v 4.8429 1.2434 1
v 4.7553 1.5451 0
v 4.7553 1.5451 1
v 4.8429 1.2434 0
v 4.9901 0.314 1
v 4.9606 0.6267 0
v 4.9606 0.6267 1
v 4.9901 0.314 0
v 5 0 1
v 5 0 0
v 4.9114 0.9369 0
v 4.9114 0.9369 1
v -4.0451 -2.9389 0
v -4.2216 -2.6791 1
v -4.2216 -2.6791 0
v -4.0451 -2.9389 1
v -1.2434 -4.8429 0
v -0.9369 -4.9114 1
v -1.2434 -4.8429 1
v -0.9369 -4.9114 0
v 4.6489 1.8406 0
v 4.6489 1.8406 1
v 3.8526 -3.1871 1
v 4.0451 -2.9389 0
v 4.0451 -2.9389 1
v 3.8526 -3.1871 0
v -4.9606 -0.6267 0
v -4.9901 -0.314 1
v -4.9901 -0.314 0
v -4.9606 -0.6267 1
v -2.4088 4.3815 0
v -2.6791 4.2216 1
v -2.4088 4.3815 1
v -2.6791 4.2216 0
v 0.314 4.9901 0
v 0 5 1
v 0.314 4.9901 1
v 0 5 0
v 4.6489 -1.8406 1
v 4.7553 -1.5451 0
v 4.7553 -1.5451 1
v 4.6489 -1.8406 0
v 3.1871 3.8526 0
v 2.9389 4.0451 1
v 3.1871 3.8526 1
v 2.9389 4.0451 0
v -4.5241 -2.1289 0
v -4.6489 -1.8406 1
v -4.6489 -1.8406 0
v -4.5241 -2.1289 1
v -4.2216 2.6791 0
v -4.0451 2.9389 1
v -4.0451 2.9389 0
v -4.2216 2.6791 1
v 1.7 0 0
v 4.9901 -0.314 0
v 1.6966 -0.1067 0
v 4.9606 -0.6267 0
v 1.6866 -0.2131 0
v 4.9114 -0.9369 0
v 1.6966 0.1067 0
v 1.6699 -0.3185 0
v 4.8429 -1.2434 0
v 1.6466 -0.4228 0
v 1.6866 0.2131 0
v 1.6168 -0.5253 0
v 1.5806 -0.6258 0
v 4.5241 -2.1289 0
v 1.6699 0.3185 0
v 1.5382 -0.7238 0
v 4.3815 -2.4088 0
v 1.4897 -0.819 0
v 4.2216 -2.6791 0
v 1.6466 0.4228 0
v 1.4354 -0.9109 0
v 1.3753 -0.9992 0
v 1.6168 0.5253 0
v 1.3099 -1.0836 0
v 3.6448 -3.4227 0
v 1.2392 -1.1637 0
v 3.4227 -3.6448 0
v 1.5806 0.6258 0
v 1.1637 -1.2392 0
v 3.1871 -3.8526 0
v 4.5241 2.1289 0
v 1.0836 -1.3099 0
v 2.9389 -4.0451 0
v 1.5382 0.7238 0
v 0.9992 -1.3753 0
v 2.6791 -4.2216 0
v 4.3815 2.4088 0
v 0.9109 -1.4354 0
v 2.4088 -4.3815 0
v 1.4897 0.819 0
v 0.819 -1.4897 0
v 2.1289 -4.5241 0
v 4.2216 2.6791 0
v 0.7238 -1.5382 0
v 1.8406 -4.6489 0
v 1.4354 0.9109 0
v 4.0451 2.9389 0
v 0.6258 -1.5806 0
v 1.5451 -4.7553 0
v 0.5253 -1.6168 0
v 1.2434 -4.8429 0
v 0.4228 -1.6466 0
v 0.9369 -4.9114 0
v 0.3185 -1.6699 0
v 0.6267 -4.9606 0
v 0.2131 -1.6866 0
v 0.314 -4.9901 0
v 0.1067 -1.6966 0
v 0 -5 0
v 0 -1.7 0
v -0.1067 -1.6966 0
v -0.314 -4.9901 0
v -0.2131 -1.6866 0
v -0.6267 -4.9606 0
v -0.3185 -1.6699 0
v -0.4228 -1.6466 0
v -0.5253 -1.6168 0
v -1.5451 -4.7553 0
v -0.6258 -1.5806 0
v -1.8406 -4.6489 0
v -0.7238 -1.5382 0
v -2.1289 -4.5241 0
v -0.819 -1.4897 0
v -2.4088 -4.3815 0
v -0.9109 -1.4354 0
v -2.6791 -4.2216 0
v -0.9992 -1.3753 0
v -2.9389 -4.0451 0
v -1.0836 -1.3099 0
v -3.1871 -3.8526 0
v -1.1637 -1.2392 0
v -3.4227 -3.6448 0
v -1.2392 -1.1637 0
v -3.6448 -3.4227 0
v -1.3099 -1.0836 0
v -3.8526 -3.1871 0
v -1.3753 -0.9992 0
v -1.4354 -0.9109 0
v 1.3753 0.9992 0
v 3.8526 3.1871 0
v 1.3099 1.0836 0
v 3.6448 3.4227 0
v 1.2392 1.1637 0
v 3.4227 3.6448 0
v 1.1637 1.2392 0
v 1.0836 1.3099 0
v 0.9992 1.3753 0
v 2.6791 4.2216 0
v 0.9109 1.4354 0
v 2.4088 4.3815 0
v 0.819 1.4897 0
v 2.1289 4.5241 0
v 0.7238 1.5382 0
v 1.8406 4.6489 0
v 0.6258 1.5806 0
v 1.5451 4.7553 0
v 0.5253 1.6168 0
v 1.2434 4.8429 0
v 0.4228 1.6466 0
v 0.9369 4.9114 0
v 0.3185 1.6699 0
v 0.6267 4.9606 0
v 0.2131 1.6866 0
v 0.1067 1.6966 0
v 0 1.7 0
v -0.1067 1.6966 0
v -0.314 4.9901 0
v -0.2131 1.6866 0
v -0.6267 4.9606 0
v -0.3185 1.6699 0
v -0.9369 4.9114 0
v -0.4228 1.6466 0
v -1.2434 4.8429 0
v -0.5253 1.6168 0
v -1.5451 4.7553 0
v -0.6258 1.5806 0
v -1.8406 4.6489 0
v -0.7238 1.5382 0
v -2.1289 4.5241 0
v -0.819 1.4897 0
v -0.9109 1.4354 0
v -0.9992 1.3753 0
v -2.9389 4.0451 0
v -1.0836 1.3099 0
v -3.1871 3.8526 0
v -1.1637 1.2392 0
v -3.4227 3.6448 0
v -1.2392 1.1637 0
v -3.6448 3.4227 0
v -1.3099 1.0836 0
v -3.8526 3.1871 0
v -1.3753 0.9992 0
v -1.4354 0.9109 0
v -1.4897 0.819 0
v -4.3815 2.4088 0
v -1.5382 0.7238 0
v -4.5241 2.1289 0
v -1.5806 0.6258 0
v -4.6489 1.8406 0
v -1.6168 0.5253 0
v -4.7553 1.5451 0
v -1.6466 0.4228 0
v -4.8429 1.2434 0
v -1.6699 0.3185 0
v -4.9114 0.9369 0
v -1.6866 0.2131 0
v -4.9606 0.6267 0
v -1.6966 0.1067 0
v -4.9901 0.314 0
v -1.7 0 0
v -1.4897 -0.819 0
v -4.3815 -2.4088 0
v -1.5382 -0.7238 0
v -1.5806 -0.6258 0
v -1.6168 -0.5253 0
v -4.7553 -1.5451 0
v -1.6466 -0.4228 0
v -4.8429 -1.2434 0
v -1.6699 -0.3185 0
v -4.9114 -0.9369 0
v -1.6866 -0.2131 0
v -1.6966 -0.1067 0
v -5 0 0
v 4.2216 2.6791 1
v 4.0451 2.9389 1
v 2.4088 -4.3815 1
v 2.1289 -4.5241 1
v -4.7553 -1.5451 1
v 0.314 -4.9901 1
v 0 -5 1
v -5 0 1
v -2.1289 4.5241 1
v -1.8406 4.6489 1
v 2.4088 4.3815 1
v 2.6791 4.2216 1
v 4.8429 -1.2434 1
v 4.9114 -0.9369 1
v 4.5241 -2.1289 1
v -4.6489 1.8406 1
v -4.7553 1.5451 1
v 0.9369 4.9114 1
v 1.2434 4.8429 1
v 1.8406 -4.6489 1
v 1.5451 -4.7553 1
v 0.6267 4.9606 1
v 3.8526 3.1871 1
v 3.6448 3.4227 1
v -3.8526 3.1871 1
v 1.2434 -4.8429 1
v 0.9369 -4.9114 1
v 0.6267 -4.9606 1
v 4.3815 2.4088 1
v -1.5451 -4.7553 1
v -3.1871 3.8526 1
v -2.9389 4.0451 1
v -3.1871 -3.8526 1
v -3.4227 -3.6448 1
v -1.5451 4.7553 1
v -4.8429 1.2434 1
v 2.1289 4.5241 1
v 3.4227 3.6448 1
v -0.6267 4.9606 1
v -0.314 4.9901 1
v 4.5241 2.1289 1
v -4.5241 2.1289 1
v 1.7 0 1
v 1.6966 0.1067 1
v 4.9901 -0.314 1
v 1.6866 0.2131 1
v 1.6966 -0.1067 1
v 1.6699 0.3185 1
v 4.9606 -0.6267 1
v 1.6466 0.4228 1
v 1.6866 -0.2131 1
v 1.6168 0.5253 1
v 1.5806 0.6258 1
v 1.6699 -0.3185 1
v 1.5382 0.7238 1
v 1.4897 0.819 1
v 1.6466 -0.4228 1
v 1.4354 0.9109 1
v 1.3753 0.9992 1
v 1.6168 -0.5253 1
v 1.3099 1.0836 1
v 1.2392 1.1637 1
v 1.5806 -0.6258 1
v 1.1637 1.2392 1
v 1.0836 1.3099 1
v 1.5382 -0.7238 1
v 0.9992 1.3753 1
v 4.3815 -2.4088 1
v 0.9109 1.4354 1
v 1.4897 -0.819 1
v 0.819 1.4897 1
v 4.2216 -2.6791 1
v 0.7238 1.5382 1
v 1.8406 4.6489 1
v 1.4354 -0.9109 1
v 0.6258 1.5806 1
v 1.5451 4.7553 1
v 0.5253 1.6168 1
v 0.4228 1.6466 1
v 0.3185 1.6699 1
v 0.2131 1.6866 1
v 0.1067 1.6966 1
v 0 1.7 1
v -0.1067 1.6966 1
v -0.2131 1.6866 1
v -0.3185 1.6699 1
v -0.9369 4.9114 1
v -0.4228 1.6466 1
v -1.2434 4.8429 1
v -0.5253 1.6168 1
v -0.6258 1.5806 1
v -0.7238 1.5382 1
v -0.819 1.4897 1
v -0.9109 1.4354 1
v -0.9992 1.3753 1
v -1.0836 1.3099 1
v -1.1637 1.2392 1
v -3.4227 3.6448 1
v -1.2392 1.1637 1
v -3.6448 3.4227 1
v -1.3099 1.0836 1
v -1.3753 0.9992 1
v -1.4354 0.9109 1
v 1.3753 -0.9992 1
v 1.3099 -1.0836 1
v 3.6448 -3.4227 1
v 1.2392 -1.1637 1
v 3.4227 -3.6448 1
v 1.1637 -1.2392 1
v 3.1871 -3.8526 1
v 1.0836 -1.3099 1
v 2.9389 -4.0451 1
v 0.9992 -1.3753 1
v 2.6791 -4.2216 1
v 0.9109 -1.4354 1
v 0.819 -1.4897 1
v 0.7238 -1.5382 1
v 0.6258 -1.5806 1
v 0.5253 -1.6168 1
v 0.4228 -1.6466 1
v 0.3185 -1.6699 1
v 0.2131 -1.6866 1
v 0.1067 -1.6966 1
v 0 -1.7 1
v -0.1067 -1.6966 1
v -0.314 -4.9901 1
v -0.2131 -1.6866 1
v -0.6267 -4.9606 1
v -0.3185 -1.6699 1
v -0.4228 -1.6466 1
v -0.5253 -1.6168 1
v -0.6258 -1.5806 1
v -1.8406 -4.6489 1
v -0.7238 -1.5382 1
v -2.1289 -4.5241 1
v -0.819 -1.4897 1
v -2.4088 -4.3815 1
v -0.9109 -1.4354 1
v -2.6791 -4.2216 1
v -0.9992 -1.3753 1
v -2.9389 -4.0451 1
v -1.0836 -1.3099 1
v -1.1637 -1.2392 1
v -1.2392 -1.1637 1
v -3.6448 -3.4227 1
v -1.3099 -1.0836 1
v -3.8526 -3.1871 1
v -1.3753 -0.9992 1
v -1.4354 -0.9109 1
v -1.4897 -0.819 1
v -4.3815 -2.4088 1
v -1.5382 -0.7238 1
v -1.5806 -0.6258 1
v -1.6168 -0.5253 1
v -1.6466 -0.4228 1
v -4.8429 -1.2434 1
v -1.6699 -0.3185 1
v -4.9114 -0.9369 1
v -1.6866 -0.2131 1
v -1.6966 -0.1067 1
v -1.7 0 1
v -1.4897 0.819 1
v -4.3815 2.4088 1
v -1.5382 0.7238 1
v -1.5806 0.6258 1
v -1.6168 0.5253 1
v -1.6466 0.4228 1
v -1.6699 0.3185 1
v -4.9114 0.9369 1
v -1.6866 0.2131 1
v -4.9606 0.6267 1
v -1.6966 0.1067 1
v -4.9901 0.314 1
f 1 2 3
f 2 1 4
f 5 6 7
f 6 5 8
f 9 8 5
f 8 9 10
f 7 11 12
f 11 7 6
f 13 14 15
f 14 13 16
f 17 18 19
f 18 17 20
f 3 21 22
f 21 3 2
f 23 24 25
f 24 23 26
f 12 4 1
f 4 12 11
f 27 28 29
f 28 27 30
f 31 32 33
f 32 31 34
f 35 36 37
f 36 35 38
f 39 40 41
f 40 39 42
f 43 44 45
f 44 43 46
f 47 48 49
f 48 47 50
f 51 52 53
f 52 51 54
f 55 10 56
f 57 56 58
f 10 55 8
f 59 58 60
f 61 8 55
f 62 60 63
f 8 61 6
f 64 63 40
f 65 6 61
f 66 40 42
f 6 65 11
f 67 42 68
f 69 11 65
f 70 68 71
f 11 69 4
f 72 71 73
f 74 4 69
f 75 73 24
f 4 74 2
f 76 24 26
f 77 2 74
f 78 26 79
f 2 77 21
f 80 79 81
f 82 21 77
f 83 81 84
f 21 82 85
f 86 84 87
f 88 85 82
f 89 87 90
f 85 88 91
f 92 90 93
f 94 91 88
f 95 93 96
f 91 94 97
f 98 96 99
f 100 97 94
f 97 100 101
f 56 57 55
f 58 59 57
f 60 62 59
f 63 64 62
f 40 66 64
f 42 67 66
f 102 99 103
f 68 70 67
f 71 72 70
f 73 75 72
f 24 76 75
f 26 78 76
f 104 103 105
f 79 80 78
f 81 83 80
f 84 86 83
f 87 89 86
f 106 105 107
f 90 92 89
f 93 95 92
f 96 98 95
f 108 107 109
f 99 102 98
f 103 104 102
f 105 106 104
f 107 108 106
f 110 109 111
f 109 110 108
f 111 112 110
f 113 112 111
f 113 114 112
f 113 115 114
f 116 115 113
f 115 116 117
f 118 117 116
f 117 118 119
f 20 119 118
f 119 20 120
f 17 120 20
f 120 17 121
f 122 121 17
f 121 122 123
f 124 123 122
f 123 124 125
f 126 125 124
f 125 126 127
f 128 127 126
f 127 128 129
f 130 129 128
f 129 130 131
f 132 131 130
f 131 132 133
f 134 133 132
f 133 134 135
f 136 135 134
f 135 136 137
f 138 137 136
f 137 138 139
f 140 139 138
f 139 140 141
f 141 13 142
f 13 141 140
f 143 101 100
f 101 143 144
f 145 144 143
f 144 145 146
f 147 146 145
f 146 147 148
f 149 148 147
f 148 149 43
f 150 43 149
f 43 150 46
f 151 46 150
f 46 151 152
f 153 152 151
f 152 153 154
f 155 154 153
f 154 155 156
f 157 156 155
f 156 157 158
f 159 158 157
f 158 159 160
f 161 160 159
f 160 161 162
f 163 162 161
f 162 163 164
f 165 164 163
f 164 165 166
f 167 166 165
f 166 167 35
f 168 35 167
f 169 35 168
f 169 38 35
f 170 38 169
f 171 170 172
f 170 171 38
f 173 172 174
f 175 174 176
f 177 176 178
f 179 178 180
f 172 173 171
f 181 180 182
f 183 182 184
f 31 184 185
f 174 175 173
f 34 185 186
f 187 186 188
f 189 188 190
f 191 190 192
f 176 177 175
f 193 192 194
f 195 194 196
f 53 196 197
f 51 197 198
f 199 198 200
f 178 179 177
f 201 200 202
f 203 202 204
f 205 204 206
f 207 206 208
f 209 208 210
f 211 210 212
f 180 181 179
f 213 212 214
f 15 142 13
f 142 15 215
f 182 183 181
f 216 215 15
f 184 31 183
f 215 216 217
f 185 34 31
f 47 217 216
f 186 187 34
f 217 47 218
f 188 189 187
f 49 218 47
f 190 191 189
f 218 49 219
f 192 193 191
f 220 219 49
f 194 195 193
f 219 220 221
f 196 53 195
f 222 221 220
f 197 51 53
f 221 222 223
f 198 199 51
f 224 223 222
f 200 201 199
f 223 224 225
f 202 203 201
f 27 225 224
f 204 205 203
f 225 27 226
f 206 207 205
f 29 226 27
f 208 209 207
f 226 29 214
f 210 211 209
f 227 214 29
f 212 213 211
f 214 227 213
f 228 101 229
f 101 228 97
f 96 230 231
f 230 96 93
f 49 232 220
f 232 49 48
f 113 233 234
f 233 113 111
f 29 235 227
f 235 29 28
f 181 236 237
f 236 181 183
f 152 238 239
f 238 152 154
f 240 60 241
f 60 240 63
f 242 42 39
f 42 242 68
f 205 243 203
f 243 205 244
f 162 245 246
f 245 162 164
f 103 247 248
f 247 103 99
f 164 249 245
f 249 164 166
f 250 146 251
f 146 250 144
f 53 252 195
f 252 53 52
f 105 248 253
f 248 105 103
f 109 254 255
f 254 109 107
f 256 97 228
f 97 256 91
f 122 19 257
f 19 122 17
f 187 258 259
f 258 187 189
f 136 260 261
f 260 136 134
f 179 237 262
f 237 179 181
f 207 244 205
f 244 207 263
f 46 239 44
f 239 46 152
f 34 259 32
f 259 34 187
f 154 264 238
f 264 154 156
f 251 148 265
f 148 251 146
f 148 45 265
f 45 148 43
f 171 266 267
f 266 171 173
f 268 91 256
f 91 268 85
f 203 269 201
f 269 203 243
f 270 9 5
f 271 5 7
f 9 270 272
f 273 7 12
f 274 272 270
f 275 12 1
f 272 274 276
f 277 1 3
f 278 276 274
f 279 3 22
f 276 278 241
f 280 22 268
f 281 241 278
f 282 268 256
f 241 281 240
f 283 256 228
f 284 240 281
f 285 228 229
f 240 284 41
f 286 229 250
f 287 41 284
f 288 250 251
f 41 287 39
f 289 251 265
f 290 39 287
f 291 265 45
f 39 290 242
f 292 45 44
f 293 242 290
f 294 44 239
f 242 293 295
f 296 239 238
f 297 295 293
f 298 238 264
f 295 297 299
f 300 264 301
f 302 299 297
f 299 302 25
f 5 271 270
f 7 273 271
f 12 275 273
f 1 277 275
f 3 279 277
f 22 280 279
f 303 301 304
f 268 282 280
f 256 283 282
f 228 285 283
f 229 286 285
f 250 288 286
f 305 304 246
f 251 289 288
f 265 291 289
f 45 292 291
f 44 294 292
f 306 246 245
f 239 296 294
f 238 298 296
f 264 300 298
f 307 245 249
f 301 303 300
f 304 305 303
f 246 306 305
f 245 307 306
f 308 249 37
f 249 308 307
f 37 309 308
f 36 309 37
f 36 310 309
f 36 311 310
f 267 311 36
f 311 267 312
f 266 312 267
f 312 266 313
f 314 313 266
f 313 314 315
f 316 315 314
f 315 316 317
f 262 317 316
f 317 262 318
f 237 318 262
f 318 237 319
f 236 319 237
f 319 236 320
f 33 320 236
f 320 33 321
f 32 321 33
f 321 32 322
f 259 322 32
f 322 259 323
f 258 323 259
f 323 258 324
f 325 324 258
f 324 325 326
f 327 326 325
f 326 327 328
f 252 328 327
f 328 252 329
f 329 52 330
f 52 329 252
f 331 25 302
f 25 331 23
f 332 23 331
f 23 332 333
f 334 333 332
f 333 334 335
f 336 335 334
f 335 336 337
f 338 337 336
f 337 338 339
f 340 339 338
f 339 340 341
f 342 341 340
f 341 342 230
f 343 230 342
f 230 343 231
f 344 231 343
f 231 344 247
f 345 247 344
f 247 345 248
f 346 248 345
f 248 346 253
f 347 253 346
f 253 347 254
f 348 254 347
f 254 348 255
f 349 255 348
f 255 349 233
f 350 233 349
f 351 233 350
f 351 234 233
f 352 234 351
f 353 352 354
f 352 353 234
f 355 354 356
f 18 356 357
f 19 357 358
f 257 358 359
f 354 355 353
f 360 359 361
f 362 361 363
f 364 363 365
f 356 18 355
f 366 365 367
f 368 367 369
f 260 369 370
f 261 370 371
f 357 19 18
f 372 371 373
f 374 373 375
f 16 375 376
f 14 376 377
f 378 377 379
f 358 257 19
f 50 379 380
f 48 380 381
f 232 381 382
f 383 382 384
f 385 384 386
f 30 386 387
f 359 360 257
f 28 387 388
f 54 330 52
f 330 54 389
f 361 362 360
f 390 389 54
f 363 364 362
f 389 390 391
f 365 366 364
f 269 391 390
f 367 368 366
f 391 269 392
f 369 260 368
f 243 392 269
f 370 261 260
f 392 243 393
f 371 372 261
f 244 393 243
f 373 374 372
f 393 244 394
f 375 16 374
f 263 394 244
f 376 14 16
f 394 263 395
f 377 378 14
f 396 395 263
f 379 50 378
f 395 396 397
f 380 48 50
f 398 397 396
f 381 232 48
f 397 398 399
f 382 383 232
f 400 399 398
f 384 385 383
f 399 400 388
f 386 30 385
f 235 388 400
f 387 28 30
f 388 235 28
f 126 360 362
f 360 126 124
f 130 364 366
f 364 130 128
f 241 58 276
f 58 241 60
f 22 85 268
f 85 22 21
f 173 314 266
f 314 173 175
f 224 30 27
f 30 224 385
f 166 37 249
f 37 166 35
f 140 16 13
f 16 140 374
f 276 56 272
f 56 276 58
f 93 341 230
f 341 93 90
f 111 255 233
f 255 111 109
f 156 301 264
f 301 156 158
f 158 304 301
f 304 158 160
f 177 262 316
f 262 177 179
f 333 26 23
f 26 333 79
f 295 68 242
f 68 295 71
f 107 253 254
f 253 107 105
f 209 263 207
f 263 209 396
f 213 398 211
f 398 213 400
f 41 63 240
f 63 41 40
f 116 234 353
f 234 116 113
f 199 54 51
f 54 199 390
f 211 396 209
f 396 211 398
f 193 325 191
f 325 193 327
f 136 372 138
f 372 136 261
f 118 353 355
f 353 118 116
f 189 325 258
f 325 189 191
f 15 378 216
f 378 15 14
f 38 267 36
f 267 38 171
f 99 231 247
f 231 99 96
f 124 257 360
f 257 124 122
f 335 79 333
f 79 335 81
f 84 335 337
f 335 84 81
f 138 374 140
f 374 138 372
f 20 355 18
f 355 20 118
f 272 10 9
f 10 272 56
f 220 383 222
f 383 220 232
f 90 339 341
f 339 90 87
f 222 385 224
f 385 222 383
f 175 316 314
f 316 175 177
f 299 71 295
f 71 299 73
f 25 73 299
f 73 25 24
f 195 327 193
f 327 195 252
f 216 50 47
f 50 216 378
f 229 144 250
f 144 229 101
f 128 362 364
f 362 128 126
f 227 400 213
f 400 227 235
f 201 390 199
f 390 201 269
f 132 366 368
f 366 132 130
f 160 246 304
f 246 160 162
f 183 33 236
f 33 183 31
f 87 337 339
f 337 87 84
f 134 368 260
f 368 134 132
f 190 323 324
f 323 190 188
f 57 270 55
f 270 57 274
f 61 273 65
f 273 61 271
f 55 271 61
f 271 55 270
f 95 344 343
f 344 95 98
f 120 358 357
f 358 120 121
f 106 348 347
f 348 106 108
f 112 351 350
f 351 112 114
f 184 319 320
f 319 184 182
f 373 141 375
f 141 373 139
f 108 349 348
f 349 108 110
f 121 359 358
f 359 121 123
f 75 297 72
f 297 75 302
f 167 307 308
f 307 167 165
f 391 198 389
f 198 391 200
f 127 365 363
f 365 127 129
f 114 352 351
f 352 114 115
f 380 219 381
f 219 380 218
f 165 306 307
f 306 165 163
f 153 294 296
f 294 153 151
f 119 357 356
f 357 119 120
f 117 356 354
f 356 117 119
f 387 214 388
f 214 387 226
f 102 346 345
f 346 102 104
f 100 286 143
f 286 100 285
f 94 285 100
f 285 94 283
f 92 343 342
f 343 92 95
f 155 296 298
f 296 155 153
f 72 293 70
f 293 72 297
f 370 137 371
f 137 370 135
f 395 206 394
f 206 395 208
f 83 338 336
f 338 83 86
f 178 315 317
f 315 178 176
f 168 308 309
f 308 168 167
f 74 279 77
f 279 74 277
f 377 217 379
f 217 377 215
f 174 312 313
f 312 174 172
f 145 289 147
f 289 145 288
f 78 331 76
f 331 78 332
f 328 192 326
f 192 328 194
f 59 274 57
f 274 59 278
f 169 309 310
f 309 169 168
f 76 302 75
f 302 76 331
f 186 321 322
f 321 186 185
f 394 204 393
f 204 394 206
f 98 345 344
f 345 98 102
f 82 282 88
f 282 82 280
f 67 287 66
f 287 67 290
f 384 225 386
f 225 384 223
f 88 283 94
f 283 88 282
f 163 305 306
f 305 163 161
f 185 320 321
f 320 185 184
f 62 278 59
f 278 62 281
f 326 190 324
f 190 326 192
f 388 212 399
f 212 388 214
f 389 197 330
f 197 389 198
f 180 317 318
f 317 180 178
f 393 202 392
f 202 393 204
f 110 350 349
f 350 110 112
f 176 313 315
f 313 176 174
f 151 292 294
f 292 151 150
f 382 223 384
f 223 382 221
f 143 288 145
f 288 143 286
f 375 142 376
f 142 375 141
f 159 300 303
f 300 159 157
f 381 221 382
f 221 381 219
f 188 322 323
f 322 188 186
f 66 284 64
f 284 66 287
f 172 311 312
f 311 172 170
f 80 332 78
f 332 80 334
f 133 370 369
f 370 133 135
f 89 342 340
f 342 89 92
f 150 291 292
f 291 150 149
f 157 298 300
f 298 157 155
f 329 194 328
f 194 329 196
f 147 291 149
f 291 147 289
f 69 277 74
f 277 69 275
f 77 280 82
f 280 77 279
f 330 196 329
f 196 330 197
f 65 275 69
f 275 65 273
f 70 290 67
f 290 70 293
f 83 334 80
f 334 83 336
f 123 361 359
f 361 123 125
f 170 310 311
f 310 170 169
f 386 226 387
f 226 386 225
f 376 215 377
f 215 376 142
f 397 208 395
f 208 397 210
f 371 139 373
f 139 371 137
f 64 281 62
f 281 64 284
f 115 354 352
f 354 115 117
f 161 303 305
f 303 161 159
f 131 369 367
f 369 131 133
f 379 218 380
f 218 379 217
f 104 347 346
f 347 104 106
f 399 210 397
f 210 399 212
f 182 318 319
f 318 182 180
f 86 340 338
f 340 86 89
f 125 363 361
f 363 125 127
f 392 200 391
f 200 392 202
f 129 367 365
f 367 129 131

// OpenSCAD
// washer to fit on top of the low-profile screw things

$fn=100;

difference() {
    cylinder(d=10,h=1);
    translate([0,0,-1]) cylinder(d=3.4,h=3);
}
